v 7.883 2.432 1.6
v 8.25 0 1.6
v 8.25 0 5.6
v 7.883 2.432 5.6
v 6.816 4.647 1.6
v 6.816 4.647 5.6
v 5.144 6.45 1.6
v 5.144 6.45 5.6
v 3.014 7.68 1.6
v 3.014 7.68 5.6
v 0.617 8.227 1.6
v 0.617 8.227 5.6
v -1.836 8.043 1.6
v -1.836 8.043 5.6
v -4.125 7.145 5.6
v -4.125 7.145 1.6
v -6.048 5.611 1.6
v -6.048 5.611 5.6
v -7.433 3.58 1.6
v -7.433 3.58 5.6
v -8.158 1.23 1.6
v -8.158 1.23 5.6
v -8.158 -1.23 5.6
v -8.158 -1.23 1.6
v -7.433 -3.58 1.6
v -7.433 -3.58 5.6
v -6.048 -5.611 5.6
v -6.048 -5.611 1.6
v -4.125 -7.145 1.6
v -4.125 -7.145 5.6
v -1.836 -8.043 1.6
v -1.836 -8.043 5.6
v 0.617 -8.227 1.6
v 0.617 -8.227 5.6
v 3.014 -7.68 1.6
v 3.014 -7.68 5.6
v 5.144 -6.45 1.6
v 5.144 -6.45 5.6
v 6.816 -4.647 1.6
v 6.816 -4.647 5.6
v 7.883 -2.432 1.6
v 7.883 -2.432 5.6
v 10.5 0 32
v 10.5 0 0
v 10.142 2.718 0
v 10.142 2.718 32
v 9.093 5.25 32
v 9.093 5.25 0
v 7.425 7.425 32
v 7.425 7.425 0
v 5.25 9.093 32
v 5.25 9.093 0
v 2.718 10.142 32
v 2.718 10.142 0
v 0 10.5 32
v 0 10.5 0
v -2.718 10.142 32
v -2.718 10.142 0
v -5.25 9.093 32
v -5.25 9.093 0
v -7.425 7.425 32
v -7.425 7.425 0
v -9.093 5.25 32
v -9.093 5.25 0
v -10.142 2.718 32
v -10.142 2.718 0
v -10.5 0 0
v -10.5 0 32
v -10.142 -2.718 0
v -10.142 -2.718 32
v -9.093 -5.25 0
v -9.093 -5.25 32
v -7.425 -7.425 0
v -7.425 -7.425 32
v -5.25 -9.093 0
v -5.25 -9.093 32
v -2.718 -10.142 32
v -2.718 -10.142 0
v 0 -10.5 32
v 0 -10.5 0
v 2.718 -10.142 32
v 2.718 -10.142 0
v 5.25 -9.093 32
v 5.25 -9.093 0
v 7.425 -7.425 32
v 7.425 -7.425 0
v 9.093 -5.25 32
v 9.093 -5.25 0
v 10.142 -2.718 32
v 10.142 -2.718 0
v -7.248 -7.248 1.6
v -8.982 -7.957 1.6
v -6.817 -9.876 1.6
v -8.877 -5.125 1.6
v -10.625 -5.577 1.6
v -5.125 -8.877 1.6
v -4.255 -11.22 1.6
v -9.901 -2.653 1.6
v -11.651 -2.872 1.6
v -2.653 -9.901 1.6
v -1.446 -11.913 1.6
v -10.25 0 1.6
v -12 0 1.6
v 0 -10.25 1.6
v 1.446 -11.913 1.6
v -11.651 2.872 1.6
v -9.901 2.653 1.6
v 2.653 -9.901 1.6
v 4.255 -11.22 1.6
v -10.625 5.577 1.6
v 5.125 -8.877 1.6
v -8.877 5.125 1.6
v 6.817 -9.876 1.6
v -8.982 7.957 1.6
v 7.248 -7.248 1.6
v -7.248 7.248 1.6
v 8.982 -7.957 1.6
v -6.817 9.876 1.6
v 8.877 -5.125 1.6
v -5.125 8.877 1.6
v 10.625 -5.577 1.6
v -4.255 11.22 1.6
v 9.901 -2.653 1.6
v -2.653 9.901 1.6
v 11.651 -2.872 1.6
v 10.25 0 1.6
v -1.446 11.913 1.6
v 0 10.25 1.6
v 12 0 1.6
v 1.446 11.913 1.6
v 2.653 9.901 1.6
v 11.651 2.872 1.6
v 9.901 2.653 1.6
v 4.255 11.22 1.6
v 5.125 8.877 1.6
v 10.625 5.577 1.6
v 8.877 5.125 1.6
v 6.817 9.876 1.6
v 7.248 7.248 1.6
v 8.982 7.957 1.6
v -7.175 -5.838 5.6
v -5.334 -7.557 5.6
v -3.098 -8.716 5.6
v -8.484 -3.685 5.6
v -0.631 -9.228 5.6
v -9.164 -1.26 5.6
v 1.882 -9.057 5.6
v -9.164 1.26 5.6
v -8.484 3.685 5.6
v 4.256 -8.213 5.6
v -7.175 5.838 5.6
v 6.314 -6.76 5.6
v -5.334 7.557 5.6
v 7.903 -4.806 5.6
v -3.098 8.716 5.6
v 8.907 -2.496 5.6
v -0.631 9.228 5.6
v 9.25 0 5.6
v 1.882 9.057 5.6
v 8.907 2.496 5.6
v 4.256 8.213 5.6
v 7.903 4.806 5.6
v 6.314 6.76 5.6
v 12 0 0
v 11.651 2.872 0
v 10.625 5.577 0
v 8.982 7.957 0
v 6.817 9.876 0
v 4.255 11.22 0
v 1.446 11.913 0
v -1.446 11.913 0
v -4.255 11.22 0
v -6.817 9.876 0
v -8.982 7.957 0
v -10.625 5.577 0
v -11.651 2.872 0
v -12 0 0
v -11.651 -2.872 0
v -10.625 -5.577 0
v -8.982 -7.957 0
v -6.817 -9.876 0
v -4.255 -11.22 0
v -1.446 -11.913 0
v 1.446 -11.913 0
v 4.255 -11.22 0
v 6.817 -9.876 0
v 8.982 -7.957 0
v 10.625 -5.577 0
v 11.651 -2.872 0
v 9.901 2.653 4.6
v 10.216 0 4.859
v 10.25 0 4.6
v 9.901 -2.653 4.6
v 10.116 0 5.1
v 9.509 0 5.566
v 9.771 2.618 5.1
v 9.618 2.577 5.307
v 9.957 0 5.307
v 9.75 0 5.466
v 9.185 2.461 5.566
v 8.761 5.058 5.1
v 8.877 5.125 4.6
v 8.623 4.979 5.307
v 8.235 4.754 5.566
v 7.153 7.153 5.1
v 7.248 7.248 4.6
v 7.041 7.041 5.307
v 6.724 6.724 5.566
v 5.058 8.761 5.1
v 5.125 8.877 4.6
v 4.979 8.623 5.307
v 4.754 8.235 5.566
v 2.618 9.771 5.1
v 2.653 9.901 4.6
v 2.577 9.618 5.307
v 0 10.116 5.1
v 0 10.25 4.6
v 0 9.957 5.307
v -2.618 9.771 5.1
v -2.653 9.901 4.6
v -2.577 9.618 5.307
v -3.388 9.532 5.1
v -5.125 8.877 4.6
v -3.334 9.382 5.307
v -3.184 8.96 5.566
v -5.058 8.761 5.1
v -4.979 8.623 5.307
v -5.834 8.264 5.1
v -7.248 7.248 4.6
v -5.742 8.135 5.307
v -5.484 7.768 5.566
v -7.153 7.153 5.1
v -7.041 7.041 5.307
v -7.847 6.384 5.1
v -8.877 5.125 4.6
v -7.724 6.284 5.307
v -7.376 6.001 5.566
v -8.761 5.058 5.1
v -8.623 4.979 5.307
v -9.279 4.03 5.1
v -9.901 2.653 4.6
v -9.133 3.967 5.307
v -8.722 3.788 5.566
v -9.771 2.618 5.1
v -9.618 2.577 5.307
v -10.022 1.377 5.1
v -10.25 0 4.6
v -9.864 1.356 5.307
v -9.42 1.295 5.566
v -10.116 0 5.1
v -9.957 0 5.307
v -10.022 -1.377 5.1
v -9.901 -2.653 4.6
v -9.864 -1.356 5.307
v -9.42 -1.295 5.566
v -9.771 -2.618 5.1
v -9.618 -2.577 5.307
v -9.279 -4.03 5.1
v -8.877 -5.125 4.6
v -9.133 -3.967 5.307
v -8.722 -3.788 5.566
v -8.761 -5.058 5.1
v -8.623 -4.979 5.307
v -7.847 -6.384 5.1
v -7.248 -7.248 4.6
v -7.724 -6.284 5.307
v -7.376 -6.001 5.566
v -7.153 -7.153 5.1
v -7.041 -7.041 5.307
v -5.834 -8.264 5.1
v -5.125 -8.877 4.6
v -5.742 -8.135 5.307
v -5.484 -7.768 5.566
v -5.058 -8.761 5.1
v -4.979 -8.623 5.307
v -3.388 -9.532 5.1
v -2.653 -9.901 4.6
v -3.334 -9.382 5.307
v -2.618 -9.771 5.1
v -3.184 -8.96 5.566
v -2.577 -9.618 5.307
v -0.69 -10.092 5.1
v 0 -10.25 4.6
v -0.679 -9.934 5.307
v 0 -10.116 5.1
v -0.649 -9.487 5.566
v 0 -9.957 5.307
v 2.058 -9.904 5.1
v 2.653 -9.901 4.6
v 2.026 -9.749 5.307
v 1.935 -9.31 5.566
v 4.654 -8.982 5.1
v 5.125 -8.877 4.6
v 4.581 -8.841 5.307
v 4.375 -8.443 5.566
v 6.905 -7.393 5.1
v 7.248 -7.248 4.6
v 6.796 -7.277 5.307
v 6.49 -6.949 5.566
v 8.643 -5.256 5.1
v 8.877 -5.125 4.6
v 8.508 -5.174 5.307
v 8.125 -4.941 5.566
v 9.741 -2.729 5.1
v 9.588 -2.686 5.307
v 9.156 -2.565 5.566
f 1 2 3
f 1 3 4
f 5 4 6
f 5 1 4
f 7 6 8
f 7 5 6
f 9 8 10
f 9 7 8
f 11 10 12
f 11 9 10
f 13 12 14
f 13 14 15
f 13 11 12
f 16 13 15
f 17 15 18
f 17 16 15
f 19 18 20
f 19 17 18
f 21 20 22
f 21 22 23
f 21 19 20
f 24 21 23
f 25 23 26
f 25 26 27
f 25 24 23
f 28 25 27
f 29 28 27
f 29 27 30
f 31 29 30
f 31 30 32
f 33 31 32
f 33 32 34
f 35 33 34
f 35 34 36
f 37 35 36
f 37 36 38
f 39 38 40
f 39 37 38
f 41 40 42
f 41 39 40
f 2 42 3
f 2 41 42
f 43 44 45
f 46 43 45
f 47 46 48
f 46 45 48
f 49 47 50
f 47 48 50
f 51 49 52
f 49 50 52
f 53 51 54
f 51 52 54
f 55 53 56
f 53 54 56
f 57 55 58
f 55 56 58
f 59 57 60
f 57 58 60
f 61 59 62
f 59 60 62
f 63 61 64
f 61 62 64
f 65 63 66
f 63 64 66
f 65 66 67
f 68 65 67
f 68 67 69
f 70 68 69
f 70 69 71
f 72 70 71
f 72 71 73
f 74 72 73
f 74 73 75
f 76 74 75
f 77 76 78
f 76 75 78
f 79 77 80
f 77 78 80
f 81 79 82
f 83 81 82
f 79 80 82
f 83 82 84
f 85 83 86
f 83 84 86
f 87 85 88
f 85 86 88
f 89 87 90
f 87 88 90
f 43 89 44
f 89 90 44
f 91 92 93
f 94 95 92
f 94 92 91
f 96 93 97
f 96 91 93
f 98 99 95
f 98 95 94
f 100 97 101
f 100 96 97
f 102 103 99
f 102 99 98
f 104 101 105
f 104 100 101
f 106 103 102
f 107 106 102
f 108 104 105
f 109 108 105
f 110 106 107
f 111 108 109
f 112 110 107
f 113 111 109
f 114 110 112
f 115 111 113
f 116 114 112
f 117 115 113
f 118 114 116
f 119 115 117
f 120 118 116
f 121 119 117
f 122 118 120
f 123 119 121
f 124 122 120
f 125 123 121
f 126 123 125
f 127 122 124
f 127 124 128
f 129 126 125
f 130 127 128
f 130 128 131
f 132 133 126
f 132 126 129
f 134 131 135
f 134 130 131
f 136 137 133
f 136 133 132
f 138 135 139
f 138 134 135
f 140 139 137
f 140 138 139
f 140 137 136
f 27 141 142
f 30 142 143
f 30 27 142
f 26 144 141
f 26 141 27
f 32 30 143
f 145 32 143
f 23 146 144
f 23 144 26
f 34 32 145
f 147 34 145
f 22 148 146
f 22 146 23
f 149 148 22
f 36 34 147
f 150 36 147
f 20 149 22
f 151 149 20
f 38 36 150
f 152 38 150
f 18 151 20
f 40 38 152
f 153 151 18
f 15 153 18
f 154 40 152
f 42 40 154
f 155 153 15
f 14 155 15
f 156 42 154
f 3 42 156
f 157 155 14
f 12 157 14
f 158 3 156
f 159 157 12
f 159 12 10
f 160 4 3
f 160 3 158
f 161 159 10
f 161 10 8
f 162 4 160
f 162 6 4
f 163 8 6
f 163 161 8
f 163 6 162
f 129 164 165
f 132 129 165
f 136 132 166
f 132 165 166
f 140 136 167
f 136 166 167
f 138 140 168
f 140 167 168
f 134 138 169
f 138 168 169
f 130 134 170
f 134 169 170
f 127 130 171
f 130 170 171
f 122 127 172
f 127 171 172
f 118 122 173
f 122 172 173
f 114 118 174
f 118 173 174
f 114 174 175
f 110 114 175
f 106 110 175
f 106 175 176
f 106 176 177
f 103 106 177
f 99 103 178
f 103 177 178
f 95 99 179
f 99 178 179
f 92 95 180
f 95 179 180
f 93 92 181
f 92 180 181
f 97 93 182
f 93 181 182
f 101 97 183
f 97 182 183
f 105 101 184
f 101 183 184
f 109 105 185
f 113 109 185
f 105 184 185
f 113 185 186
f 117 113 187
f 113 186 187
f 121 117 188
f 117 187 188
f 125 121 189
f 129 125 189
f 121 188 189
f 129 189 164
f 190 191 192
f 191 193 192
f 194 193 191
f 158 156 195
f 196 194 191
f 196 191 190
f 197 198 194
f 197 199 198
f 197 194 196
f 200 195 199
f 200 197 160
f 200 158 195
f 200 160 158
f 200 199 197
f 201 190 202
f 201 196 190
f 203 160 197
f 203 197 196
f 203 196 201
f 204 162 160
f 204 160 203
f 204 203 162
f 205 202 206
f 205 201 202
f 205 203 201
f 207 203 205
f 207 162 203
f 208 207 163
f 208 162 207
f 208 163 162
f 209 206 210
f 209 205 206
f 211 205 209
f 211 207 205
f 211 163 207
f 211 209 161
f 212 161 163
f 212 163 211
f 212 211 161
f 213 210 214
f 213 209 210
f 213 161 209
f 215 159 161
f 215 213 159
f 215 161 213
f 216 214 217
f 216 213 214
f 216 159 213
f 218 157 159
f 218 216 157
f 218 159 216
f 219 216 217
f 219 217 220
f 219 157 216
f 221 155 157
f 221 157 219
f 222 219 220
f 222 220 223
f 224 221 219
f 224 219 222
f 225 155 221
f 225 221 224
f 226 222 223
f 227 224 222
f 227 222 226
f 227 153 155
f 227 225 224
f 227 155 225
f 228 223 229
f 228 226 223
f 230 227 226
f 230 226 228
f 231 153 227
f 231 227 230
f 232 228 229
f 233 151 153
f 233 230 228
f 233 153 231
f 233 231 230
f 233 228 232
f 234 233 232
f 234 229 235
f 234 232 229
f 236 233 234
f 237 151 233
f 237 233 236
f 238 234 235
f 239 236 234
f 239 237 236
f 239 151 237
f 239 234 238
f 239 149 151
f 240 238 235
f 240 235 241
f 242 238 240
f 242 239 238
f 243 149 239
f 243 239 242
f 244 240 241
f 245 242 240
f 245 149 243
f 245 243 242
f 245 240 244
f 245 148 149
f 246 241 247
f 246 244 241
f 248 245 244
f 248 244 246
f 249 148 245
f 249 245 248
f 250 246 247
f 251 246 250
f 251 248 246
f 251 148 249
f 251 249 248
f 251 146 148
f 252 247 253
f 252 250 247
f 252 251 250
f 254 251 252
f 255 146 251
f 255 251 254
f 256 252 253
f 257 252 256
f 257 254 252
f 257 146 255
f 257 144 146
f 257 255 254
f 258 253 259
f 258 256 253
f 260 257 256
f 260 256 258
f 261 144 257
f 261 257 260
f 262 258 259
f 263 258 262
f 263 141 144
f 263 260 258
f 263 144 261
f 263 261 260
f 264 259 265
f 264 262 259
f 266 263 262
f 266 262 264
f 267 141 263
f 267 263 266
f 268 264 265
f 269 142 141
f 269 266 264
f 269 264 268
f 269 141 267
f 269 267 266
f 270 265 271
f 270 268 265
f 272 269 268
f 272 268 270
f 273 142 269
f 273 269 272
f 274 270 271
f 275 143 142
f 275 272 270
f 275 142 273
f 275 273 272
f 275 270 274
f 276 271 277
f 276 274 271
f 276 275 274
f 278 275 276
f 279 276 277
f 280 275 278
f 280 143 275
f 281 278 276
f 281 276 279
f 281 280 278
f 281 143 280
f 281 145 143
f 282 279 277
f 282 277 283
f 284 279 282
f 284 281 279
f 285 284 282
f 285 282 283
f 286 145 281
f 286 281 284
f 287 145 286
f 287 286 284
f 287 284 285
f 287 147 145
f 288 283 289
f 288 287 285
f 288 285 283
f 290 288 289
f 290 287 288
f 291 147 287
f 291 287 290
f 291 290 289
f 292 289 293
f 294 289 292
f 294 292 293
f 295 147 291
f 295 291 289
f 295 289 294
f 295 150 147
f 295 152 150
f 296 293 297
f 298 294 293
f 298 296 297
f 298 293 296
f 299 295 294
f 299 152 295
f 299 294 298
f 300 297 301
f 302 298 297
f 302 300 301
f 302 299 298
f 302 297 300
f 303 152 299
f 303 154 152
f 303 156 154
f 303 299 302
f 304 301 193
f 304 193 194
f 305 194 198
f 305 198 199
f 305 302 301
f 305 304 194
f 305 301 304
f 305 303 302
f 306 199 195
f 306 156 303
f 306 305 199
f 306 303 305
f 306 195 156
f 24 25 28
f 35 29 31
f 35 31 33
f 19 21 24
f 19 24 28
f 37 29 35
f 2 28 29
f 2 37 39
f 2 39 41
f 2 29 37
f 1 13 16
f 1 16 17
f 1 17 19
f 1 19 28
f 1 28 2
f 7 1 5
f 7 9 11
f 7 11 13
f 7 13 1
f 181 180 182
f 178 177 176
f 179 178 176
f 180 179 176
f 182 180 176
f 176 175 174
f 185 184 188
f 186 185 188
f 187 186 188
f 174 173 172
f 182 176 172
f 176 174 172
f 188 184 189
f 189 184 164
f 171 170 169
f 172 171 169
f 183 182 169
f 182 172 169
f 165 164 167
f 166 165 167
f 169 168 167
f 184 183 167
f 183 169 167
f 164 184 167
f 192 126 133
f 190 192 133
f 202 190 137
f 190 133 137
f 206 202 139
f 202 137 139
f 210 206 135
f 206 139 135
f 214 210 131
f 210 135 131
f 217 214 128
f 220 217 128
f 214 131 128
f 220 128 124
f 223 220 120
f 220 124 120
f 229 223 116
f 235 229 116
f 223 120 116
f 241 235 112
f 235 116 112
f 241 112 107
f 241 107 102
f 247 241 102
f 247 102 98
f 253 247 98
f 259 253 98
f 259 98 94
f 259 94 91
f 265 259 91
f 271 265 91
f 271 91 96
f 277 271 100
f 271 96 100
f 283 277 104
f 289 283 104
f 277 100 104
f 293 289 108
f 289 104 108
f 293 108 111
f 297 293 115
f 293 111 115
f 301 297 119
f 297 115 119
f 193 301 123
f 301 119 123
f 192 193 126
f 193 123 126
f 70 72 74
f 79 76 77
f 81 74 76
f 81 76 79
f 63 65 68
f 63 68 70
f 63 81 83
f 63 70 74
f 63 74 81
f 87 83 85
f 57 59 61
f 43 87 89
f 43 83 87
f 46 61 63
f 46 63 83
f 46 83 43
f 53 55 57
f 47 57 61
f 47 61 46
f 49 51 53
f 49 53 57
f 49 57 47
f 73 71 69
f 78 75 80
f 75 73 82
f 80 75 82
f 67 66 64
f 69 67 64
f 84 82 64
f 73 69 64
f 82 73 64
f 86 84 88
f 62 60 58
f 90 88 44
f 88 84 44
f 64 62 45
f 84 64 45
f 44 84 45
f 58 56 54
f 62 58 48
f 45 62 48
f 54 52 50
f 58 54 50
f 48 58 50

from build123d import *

# Parameters (mm, degrees)
CYLINDER_R        = 10.5
CYLINDER_DEPTH    = 32
CYLINDER001_R     = 12
CYLINDER001_DEPTH = 1.6
SKETCH_R          = 10.25
SKETCH_R_2        = 8.25
PAD_DEPTH         = 4
FILLET_R          = 1


with BuildPart() as body:
    # Cylinder → Cylinder (join)
    with BuildSketch(Plane.XY):
        Circle(CYLINDER_R)
    extrude(amount=CYLINDER_DEPTH)


with BuildPart() as body001:
    # Cylinder001 → Cylinder001 (join)
    with BuildSketch(Plane.XY):
        Circle(CYLINDER001_R)
    extrude(amount=CYLINDER001_DEPTH)

    # Sketch → Pad (join)
    with BuildSketch(Plane.XY.offset(1.6)):
        Circle(SKETCH_R)
        Circle(SKETCH_R_2, mode=Mode.SUBTRACT)
    extrude(amount=PAD_DEPTH)

    # Fillet
    fillet_edges = [body001.edges().sort_by_distance(p)[0] for p in [
        (-10.25, 0, 5.6),
    ]]
    fillet(fillet_edges, radius=FILLET_R)


solid = Compound([body.part, body001.part])
